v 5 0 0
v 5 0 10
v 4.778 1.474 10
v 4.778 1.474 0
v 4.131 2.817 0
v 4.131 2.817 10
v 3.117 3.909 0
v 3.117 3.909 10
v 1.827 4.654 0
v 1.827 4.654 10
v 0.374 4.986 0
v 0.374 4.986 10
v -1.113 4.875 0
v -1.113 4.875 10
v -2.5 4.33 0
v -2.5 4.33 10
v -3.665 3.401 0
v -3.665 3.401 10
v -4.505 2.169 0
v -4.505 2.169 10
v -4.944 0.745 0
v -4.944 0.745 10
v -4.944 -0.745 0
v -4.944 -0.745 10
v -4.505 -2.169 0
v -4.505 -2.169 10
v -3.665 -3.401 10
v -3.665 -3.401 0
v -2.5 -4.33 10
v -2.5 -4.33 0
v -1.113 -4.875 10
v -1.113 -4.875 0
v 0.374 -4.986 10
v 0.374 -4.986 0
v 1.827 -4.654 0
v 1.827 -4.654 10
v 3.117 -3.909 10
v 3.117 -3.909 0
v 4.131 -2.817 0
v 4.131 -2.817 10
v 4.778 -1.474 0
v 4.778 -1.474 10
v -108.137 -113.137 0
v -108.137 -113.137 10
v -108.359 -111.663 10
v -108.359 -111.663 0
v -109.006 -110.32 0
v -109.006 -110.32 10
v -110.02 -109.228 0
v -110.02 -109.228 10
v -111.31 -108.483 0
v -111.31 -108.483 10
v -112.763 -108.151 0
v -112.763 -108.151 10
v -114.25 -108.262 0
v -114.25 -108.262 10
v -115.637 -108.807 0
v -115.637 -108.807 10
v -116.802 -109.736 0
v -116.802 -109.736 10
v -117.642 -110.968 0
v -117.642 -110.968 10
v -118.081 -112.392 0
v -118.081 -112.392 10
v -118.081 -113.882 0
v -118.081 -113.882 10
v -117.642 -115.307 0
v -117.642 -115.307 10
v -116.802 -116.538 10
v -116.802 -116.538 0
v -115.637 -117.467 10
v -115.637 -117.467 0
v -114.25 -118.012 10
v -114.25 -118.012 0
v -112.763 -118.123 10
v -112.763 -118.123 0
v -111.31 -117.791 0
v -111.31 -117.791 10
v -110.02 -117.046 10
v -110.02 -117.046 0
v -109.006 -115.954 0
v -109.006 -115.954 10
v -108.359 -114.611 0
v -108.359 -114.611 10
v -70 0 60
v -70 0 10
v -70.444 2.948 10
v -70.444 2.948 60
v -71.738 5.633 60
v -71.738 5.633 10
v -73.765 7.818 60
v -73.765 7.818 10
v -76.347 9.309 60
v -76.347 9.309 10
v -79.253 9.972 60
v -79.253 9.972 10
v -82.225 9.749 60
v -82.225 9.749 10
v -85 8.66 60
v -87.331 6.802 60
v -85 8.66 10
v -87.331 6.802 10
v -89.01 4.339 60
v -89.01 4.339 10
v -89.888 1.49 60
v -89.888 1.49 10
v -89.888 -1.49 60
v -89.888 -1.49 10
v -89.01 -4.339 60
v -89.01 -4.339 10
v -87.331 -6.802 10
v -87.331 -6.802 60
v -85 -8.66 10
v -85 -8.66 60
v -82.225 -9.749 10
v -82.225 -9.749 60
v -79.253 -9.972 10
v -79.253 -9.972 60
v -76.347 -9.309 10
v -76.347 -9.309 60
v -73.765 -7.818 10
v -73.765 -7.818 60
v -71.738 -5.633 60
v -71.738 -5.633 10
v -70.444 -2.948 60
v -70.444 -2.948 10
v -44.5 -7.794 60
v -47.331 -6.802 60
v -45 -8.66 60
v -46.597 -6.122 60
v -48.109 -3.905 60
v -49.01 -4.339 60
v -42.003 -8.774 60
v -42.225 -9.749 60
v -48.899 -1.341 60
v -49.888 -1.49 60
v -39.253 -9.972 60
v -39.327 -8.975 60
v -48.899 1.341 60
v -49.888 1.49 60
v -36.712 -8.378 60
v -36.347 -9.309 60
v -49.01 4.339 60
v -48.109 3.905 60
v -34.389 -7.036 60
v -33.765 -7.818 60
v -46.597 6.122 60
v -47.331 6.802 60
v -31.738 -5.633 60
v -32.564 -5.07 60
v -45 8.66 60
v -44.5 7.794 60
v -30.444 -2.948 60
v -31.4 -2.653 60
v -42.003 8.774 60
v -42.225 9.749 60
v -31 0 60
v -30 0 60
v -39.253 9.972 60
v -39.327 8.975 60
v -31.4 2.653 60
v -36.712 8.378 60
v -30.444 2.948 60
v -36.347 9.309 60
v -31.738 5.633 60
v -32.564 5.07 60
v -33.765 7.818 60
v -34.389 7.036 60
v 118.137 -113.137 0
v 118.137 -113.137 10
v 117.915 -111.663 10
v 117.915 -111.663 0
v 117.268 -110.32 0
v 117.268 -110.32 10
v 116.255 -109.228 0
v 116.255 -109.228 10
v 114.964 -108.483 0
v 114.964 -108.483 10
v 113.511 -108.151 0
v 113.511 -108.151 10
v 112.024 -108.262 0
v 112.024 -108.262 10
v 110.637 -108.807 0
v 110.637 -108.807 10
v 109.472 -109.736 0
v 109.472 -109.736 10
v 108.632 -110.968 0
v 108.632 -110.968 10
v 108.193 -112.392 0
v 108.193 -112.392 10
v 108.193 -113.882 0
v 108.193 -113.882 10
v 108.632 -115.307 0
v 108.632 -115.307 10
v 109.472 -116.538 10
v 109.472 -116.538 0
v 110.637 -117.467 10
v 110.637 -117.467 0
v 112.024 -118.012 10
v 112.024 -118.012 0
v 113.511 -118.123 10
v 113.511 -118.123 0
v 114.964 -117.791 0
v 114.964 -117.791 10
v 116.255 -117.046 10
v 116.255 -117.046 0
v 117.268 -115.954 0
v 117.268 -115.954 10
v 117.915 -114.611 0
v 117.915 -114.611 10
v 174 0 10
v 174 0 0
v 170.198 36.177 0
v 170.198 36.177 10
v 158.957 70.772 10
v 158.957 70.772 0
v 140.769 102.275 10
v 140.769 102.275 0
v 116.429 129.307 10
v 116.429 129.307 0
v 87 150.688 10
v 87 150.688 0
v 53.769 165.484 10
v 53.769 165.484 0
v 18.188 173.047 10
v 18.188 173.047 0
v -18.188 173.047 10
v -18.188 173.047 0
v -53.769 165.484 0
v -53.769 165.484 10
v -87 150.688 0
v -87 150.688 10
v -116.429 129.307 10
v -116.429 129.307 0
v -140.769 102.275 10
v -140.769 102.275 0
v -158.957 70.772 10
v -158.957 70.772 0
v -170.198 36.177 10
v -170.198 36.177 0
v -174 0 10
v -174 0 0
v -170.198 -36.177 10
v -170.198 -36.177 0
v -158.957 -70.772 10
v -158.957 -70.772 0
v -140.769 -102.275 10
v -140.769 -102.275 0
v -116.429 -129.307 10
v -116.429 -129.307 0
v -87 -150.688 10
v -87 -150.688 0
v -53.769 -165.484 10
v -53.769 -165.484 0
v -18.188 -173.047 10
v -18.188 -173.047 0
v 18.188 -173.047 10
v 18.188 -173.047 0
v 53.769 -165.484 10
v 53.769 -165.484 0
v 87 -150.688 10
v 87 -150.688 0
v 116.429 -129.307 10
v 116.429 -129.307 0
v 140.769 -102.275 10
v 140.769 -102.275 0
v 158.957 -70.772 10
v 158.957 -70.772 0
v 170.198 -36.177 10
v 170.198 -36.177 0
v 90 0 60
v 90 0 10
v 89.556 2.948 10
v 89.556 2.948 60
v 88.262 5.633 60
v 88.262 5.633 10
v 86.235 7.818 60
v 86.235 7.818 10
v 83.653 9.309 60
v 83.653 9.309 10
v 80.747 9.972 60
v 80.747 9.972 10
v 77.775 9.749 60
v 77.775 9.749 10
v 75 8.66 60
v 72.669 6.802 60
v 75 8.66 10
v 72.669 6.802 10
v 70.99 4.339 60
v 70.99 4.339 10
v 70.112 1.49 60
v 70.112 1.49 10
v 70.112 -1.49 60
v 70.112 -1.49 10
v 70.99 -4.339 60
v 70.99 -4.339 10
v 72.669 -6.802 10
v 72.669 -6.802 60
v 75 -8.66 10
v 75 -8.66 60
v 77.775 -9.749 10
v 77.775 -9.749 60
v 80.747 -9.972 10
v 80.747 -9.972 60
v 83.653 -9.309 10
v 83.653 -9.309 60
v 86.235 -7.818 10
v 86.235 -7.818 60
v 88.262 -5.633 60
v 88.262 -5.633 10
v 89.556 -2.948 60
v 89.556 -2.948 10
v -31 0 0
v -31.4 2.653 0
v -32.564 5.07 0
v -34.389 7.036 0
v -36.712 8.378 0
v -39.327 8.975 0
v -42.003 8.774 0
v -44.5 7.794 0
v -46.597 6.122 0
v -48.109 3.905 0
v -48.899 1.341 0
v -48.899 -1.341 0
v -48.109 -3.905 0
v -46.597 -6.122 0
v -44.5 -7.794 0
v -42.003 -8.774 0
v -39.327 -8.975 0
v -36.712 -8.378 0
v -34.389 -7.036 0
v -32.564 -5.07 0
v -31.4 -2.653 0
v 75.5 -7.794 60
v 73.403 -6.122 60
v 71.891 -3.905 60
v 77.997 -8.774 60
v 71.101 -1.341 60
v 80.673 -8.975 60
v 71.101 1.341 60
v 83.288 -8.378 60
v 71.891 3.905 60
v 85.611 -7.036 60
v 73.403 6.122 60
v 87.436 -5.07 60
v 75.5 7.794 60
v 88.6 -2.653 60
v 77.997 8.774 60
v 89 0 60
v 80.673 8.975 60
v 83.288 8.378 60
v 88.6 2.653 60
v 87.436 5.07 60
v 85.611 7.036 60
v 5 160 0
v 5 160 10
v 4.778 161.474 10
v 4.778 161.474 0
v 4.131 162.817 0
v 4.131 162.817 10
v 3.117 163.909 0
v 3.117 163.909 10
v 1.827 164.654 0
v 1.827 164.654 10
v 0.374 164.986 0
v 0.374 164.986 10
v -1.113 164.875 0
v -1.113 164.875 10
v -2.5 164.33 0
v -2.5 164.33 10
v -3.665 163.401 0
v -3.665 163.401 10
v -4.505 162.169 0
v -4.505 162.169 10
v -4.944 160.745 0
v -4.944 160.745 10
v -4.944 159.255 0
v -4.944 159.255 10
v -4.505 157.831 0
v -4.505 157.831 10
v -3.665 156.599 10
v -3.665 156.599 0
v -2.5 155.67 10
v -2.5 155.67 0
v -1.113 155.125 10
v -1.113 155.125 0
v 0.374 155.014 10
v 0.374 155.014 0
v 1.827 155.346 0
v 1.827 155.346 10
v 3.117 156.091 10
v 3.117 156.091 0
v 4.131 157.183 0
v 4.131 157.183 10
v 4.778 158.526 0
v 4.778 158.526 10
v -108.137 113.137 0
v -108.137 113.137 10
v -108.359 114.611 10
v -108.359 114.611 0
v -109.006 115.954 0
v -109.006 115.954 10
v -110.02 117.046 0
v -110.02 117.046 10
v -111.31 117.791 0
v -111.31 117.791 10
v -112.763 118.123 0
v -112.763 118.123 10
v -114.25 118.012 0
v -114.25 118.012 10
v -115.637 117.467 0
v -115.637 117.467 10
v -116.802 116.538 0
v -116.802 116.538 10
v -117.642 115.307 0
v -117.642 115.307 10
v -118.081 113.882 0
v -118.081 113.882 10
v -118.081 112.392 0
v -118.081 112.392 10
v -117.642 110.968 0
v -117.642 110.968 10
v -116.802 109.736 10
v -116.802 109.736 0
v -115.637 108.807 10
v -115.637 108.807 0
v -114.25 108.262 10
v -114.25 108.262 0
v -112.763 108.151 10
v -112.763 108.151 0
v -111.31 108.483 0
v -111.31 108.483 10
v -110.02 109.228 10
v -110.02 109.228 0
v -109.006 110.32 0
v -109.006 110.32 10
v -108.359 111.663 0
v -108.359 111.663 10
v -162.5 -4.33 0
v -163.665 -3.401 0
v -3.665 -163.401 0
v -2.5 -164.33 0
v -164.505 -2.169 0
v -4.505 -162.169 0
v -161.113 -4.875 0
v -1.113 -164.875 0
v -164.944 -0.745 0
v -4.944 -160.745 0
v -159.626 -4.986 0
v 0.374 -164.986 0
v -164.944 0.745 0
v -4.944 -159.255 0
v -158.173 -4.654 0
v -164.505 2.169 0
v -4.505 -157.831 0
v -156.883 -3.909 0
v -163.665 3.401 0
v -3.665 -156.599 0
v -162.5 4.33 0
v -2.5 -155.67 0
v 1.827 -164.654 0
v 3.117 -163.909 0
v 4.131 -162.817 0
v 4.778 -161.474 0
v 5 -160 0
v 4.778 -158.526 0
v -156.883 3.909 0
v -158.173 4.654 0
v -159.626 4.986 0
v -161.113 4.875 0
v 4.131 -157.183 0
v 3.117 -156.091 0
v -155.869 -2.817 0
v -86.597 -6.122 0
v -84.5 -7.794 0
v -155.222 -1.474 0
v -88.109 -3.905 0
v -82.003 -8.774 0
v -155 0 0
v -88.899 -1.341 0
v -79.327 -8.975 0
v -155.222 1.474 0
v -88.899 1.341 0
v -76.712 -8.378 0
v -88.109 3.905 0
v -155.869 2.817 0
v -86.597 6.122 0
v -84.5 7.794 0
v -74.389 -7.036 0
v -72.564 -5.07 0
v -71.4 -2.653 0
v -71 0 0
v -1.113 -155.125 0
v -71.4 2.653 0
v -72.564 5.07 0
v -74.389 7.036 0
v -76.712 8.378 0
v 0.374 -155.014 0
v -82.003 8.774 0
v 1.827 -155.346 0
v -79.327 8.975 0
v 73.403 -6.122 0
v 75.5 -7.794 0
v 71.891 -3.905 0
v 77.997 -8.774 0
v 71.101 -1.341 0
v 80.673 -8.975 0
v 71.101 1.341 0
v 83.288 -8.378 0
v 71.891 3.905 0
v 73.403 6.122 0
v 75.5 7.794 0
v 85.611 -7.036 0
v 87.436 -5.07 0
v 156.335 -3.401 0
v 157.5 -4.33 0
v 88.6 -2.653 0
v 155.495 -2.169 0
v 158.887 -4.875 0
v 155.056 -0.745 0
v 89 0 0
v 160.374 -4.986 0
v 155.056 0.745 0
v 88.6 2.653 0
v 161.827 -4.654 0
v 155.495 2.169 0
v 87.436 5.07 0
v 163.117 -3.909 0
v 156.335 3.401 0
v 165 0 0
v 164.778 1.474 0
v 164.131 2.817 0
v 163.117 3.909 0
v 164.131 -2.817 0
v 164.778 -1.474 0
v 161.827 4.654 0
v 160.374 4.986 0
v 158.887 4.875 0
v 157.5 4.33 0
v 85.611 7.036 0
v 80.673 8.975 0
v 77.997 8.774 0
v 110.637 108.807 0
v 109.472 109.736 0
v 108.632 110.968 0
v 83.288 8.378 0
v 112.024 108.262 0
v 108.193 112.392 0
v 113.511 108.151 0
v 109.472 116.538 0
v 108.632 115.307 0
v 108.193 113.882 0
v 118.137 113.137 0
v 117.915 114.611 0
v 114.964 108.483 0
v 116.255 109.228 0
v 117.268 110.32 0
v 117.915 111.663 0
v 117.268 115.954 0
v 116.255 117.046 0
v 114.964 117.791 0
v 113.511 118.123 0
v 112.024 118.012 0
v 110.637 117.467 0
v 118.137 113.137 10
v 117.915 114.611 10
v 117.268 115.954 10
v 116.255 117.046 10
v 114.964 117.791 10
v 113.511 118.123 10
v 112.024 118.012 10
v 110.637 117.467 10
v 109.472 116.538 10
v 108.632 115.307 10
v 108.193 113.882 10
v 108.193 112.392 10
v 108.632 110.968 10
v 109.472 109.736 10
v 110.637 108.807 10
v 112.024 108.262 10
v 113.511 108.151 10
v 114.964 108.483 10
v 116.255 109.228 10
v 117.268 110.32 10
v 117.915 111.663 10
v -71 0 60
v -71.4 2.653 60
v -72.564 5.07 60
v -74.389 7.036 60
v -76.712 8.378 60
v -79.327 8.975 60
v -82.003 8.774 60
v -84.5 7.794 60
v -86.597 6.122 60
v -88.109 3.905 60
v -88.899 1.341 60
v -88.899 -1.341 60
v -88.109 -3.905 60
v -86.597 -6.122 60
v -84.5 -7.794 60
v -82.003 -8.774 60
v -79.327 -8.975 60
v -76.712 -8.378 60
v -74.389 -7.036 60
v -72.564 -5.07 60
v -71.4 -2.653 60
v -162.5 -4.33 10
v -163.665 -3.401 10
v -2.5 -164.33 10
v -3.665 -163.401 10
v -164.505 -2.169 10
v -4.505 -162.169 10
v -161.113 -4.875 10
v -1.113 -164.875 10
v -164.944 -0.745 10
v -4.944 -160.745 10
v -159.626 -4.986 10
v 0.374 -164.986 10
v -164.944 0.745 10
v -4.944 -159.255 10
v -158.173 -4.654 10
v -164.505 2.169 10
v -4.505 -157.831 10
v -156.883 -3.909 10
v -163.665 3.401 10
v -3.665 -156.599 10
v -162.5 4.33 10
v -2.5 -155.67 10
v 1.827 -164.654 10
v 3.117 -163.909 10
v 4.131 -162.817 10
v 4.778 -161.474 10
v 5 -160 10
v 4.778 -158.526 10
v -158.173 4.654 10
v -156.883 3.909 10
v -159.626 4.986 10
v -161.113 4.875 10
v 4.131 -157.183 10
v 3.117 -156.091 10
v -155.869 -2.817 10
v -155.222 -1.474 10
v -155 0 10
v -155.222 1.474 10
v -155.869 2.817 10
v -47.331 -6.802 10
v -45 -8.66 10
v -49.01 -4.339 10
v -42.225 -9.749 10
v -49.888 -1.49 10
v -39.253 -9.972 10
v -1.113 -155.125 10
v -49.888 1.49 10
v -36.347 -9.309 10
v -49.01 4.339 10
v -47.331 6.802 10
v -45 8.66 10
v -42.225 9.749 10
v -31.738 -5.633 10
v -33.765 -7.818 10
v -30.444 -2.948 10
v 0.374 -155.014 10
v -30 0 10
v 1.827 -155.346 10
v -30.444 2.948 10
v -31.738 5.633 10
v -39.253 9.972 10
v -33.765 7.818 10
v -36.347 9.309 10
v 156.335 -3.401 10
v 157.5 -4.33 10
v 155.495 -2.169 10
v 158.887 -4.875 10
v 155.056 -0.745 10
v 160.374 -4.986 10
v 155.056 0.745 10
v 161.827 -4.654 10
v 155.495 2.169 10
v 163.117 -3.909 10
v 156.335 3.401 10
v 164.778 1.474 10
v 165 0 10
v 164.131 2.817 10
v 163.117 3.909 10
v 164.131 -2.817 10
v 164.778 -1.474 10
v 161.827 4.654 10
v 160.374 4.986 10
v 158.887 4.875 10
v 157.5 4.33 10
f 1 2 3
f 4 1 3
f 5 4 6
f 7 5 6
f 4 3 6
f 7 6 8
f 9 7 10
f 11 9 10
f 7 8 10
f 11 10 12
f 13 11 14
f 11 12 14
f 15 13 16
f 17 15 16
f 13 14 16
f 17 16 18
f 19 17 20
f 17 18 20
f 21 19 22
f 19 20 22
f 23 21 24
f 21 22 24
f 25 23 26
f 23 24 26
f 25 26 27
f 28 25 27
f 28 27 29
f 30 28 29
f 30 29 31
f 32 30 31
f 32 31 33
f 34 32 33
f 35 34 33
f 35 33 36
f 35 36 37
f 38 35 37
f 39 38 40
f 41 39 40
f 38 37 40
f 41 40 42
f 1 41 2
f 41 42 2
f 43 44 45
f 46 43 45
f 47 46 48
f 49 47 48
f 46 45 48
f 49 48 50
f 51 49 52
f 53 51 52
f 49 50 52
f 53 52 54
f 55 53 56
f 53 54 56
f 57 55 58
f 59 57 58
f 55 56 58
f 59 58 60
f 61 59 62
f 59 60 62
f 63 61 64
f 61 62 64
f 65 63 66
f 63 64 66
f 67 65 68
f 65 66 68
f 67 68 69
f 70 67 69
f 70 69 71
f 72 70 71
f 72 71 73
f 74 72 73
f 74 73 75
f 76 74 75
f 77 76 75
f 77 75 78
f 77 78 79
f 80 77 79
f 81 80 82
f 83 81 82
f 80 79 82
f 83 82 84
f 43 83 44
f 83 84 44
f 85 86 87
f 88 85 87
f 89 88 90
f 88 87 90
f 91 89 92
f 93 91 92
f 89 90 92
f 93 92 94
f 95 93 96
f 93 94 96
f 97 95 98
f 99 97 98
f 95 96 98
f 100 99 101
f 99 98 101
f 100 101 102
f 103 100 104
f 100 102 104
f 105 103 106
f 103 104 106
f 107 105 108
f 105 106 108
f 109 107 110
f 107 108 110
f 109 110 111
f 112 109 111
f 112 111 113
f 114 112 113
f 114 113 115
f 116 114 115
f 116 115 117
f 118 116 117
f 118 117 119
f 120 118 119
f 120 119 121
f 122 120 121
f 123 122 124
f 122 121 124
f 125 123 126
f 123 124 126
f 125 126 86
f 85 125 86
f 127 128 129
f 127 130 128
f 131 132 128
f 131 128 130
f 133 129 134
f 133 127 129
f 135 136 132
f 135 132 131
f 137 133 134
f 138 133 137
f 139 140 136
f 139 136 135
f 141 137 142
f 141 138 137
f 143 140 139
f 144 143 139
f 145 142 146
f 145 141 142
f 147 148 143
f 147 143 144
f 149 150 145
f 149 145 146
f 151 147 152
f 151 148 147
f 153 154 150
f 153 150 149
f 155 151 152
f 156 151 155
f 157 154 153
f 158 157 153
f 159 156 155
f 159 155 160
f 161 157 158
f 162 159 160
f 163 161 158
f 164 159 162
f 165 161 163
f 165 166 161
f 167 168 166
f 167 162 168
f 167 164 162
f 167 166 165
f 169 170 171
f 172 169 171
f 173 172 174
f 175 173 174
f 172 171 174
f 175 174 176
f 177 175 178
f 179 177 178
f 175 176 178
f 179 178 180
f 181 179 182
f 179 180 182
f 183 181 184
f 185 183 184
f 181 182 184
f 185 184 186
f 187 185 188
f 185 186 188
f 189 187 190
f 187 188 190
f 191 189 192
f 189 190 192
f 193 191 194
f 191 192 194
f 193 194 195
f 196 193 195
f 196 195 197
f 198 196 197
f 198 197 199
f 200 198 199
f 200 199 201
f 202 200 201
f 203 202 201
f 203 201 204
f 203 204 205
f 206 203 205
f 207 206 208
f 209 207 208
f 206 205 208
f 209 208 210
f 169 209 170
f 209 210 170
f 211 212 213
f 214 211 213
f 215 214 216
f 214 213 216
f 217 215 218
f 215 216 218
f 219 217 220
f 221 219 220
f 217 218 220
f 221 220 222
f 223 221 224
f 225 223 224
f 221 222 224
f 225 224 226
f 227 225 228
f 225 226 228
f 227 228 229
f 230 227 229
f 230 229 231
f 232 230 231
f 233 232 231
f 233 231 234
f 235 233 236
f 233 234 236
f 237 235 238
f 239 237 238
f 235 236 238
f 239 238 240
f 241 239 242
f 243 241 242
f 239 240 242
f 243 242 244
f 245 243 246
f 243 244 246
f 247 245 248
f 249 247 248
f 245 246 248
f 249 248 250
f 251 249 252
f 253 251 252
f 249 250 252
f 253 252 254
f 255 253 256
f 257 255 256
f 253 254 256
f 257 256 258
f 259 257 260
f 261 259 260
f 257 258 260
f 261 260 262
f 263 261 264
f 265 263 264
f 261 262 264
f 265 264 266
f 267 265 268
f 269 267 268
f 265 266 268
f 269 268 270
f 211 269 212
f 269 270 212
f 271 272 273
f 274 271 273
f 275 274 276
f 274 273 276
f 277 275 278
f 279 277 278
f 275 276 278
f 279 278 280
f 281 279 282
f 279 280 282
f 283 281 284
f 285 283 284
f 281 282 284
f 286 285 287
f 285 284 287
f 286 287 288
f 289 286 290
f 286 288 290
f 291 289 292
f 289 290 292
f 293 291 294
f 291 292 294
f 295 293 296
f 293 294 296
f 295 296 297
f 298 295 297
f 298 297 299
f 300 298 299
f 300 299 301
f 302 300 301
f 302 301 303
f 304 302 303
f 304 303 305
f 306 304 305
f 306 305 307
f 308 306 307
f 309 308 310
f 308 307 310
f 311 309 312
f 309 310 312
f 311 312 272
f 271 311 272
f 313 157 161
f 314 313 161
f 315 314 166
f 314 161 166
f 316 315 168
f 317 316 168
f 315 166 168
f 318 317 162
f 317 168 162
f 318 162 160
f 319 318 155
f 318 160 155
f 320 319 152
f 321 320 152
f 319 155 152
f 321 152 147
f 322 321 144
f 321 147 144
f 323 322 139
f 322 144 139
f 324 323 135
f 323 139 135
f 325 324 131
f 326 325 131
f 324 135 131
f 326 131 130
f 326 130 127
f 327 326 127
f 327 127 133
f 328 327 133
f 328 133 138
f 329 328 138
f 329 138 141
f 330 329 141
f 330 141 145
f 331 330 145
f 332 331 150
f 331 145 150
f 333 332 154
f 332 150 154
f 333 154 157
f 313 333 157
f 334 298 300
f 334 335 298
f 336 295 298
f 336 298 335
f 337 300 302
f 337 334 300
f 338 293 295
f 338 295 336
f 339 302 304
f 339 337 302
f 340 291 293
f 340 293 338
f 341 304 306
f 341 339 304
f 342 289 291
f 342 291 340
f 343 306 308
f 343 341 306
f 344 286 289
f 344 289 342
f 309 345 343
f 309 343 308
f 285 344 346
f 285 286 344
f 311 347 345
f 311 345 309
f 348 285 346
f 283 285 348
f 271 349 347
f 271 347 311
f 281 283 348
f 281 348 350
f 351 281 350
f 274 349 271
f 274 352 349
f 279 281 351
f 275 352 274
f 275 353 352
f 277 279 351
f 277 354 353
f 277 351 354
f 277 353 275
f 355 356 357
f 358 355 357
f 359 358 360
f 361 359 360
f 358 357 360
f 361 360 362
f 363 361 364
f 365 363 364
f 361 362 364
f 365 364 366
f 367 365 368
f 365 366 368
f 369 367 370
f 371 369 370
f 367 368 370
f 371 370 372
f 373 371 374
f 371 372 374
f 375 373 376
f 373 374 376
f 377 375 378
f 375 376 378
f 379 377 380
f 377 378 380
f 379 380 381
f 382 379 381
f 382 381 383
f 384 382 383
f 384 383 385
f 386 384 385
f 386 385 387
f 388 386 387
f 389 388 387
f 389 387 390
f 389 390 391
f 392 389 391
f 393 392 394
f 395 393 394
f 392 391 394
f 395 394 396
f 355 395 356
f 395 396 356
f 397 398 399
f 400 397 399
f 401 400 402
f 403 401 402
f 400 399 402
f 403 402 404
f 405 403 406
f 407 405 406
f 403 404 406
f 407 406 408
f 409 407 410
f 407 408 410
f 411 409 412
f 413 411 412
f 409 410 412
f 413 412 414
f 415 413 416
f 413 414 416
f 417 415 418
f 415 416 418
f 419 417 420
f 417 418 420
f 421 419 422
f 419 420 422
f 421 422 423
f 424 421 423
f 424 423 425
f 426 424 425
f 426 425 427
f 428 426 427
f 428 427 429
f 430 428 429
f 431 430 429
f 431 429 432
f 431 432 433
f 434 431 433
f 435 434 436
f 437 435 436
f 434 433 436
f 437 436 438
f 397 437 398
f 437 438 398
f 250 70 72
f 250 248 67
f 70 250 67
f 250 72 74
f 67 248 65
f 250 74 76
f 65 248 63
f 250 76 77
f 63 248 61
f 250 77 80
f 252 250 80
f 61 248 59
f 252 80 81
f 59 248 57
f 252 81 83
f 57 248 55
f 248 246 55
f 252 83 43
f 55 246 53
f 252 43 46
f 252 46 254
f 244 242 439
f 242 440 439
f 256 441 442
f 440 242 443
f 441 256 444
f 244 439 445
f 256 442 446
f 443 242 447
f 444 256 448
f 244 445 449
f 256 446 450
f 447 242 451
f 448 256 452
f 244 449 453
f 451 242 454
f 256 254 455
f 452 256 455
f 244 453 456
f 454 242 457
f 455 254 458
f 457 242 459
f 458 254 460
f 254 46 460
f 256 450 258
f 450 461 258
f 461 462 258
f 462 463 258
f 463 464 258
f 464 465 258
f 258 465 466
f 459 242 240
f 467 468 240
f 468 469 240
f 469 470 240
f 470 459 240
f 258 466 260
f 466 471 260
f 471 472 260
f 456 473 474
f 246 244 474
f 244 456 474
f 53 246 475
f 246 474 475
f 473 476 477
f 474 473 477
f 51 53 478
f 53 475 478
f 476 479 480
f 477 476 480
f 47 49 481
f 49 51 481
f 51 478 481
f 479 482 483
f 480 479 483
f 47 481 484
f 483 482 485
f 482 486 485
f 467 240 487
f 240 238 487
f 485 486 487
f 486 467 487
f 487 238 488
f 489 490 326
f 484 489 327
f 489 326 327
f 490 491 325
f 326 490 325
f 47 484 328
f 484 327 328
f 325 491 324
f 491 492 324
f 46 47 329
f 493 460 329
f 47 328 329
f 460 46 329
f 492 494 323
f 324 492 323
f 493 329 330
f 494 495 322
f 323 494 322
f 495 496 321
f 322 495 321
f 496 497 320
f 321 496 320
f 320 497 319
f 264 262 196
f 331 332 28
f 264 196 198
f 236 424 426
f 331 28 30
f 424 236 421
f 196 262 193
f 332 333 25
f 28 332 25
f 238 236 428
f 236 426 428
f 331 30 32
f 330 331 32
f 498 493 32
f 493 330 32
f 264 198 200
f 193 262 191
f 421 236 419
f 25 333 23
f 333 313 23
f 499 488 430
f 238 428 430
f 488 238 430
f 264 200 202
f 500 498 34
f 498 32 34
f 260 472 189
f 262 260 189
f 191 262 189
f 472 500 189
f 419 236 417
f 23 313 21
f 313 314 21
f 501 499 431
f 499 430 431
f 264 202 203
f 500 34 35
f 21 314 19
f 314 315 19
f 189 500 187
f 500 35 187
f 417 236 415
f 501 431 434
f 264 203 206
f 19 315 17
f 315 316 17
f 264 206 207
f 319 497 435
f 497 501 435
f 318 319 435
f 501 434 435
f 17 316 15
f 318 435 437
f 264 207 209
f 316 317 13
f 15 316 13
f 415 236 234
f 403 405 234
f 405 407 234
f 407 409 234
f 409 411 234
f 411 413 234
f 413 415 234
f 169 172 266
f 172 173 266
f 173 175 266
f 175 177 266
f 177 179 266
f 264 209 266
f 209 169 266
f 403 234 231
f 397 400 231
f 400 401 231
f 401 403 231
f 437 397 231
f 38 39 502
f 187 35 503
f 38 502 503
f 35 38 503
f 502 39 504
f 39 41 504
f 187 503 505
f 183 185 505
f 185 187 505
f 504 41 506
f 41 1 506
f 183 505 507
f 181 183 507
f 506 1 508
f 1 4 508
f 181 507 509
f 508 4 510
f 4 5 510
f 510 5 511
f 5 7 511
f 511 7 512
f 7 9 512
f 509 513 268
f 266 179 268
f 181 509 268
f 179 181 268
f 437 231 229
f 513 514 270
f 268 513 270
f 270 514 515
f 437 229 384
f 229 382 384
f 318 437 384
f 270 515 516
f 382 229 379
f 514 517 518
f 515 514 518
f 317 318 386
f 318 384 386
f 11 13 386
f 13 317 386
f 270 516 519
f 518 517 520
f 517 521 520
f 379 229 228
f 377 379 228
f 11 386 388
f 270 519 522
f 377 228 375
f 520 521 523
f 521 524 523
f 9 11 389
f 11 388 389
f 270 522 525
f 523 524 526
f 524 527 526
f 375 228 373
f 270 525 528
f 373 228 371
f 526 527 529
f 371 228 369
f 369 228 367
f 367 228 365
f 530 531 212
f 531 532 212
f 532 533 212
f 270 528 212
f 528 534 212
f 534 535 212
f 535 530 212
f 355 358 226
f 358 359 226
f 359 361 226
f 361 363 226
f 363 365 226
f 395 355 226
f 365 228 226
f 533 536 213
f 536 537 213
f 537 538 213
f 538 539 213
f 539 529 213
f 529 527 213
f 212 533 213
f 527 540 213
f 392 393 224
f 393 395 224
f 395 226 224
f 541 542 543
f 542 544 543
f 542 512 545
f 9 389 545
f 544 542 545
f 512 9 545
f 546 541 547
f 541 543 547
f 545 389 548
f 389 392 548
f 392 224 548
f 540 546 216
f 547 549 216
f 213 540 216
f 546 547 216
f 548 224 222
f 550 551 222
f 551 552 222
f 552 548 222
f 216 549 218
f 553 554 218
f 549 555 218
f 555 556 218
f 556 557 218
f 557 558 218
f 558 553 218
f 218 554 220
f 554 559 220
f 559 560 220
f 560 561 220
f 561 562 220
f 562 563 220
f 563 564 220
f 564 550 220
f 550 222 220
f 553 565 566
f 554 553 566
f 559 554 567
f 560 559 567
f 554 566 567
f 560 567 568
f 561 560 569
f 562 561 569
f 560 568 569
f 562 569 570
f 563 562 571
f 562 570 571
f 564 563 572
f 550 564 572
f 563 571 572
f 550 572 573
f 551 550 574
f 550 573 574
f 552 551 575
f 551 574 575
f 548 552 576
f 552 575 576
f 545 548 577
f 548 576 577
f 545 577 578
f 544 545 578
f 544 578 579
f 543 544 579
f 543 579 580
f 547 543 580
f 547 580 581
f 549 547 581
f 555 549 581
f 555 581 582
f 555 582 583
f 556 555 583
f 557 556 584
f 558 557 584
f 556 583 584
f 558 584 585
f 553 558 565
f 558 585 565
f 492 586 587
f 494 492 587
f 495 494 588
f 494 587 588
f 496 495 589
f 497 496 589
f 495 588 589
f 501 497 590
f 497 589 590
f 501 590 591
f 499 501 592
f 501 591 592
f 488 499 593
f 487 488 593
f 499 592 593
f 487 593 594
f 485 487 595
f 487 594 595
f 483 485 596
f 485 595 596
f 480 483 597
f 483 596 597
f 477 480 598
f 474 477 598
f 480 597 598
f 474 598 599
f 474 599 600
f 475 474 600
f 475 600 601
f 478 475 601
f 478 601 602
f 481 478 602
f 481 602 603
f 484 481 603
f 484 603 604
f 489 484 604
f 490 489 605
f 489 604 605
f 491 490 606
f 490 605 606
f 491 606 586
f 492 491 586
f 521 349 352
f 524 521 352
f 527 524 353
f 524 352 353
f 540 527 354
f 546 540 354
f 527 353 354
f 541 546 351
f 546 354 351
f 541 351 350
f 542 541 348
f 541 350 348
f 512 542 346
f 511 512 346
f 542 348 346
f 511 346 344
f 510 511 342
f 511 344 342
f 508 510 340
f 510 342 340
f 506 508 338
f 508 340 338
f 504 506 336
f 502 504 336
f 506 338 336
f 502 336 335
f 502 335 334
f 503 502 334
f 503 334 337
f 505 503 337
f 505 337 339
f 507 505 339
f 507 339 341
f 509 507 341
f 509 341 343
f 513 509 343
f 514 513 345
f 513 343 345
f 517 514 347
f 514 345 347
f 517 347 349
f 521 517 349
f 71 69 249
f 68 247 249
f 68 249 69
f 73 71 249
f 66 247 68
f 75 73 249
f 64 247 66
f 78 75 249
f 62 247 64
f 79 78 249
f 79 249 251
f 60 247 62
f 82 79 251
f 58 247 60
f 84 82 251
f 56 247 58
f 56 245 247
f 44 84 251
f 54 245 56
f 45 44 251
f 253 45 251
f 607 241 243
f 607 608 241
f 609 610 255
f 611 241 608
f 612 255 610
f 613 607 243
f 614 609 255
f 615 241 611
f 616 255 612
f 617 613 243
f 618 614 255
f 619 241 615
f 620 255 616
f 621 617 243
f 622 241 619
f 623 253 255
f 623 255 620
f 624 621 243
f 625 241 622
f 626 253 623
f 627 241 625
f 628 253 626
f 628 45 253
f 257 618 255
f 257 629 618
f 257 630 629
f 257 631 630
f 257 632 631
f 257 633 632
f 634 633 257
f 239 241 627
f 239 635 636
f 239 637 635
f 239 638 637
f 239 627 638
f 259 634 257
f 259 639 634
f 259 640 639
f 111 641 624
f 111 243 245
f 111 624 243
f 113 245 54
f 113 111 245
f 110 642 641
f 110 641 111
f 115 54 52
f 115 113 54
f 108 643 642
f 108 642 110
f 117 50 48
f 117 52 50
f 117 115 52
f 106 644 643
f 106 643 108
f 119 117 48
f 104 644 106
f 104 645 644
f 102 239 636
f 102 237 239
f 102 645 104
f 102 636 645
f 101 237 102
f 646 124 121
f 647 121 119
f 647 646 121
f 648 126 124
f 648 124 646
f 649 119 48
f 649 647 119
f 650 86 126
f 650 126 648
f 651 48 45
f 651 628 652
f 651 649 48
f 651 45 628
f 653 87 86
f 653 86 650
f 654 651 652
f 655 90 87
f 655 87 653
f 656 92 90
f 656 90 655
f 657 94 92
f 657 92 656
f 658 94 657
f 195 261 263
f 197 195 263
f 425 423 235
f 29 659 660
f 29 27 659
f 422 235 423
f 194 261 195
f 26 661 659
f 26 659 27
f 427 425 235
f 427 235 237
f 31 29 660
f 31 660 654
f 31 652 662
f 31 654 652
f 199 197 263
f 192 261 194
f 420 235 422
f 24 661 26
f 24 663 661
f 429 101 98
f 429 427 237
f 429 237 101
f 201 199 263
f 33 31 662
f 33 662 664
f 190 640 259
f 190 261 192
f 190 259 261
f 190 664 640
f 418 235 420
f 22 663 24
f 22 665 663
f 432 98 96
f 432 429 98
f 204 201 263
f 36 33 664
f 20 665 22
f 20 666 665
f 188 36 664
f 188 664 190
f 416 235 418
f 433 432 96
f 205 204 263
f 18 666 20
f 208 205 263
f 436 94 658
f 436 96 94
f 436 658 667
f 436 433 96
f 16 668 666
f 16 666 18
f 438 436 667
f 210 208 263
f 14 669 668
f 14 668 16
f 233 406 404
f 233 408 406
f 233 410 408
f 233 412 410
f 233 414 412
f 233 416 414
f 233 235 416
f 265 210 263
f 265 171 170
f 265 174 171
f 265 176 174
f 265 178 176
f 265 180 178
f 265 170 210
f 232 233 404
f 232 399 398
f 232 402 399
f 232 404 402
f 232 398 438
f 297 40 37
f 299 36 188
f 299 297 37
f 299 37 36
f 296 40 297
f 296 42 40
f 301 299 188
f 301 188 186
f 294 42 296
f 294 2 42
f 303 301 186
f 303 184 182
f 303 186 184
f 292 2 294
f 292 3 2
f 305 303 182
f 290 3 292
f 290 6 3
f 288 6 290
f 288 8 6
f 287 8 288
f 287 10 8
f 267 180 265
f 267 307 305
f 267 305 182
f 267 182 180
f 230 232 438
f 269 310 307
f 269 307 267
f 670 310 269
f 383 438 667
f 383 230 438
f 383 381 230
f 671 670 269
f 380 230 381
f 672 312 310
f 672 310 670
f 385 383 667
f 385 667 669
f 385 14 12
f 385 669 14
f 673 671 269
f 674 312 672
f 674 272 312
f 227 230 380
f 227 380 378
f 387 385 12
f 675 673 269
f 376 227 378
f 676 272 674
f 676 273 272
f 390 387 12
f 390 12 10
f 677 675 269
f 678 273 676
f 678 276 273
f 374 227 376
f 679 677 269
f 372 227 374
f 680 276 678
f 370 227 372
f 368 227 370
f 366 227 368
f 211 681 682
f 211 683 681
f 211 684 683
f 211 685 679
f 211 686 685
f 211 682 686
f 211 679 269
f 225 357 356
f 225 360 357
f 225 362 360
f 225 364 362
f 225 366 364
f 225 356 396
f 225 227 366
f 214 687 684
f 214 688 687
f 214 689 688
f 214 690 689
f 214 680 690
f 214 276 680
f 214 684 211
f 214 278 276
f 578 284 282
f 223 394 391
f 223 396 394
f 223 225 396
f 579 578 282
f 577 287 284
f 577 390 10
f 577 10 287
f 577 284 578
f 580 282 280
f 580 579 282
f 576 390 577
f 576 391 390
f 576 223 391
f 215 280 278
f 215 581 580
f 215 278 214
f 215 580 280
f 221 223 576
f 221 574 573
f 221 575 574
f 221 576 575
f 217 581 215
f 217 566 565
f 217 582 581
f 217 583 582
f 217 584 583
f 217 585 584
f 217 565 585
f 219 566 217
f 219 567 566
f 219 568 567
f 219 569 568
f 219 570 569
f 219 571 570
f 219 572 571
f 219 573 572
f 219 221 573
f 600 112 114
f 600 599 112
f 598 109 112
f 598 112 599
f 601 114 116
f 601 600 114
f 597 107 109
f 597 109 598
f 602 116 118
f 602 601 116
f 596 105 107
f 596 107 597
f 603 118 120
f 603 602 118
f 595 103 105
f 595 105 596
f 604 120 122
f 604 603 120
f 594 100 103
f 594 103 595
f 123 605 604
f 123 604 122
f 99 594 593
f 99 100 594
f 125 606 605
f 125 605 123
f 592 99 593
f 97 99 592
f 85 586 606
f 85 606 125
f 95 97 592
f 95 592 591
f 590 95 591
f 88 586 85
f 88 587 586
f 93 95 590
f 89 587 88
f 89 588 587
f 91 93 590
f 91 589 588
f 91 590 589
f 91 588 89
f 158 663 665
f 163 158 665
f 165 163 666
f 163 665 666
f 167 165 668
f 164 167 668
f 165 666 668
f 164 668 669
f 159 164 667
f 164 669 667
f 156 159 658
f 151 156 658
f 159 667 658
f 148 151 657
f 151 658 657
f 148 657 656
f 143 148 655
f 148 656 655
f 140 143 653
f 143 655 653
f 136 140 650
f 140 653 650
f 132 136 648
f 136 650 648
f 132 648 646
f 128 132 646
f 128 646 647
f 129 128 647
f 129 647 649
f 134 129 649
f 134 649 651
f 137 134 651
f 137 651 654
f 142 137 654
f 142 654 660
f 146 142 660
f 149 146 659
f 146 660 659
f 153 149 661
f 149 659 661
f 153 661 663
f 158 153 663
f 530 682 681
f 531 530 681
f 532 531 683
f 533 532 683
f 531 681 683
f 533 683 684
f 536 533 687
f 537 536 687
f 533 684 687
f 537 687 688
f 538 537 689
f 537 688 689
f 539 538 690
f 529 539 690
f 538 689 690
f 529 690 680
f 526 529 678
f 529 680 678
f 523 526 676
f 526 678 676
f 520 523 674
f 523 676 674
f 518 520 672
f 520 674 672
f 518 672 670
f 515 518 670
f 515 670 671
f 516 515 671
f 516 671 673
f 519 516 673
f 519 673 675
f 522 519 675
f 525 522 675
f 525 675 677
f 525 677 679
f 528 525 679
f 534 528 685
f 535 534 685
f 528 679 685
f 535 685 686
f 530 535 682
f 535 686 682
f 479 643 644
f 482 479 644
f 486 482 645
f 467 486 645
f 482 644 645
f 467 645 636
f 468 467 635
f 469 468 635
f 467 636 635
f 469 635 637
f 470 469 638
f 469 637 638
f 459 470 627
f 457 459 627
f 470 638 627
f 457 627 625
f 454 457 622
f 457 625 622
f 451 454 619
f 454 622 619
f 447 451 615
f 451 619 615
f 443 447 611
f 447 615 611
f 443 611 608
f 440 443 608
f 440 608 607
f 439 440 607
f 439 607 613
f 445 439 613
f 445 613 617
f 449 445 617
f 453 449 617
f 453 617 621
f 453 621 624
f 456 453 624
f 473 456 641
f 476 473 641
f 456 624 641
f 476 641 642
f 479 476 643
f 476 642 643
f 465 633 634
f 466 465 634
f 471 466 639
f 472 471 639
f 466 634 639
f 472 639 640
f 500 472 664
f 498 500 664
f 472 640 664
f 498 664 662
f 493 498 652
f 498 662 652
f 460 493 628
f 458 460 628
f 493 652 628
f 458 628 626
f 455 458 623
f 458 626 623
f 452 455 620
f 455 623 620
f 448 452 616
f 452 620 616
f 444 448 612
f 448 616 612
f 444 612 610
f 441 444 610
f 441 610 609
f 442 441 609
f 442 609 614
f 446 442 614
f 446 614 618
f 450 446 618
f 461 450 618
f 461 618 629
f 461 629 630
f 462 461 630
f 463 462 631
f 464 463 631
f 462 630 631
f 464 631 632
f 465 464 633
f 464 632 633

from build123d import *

# Parameters (mm, degrees)
F0_R      = 174
F1_DEPTH  = 10
F2_R      = 5
F3_DEPTH  = 10
F4_R      = 5
F5_DEPTH  = 10
F6_R      = 10
F7_DEPTH  = 50
F9_R      = 9
F8_R      = 9
F10_R     = 9
F11_DEPTH = 60


with BuildPart() as f1:
    # F0 (on Top) → F1 (new body)
    with BuildSketch(Plane.XY):
        Circle(F0_R)
    extrude(amount=F1_DEPTH)

    # F2 (on face) → F3 (cut, through all)
    with BuildSketch(Plane.XY.offset(10)):
        with Locations((0, 160)):
            Circle(F2_R)
        with Locations((-113.137085, 113.137085)):
            Circle(F2_R)
        with Locations((-160, 0)):
            Circle(F2_R)
        with Locations((-113.137085, -113.137085)):
            Circle(F2_R)
        with Locations((0, -160)):
            Circle(F2_R)
        with Locations((113.137085, -113.137085)):
            Circle(F2_R)
        with Locations((160, 0)):
            Circle(F2_R)
        with Locations((113.137085, 113.137085)):
            Circle(F2_R)
    extrude(amount=-F3_DEPTH, mode=Mode.SUBTRACT)

    # F4 (on face) → F5 (cut, through all)
    with BuildSketch(Plane.XY.offset(10)):
        Circle(F4_R)
    extrude(amount=-F5_DEPTH, mode=Mode.SUBTRACT)

    # F6 (on face) → F7 (join)
    with BuildSketch(Plane.XY.offset(10)):
        with Locations((80, 0)):
            Circle(F6_R)
        with Locations((-40, 0)):
            Circle(F6_R)
        with Locations((-80, 0)):
            Circle(F6_R)
    extrude(amount=F7_DEPTH)

    # F9 (on face) + F8 (on face) + F10 (on face) → F11 (cut, through all)
    with BuildSketch(Plane.XY.offset(60)):
        with Locations((-80, 0)):
            Circle(F9_R)
    with BuildSketch(Plane.XY.offset(60)):
        with Locations((-40, 0)):
            Circle(F8_R)
    with BuildSketch(Plane.XY.offset(60)):
        with Locations((80, 0)):
            Circle(F10_R)
    extrude(amount=-F11_DEPTH, mode=Mode.SUBTRACT)


solid = f1.part
